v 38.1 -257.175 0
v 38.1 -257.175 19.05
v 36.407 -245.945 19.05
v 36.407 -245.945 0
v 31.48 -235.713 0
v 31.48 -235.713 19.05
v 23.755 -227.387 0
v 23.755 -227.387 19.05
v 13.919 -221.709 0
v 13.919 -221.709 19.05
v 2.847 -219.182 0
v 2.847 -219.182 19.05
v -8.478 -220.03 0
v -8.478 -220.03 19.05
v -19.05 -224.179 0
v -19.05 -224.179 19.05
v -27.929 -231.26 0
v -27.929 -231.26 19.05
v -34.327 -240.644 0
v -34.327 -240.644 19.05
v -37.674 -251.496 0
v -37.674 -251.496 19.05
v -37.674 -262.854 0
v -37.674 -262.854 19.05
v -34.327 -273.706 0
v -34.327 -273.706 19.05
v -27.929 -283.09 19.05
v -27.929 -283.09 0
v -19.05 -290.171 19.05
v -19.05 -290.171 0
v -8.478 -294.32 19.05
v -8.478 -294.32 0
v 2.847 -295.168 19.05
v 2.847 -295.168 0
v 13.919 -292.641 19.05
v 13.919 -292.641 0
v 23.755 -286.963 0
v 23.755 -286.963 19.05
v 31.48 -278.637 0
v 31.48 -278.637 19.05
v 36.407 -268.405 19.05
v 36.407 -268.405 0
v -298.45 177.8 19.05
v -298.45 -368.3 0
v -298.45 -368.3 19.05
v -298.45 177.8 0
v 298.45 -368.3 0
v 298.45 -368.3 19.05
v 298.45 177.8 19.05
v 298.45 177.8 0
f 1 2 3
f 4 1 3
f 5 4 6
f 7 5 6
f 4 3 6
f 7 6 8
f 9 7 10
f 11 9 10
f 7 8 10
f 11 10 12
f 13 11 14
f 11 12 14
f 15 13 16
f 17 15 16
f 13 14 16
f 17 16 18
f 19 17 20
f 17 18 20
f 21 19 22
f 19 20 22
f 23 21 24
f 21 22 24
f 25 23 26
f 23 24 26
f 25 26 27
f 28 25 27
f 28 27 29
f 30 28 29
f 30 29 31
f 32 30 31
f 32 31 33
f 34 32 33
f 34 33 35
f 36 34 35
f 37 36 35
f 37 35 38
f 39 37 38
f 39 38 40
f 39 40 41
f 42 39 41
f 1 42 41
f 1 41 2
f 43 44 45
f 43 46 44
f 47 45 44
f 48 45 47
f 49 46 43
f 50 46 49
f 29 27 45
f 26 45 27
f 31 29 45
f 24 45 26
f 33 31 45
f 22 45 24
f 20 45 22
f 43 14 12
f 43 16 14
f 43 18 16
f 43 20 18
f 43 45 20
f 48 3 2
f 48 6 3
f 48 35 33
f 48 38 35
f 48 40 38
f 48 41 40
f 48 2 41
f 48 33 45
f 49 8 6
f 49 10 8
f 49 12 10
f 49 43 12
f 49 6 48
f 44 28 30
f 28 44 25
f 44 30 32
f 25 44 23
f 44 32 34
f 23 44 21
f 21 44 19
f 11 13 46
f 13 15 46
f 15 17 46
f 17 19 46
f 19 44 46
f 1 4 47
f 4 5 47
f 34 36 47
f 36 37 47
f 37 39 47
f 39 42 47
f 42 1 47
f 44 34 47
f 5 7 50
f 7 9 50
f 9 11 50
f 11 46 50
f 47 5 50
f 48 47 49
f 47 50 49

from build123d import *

# Parameters (mm, degrees)
SKETCH1_W           = 596.9
SKETCH1_H           = 304.8
BOSS_EXTRUDE1_DEPTH = 19.05
SKETCH2_W           = 596.9
SKETCH2_H           = 19.05
BOSS_EXTRUDE2_DEPTH = 25.4
SKETCH3_W           = 596.9
SKETCH3_H           = 19.05
BOSS_EXTRUDE3_DEPTH = 215.9
SKETCH4_R           = 38.1
CUT_EXTRUDE1_DEPTH  = 20.05


with BuildPart() as part:
    # Sketch1 → Boss-Extrude1 (new body)
    with BuildSketch(Plane.XY):
        Rectangle(SKETCH1_W, SKETCH1_H)
    extrude(amount=BOSS_EXTRUDE1_DEPTH)

    # Sketch2 → Boss-Extrude2 (add)
    with BuildSketch(Plane(origin=(0, 152.4, 0), x_dir=(1, 0, 0), z_dir=(0, 1, 0))):
        with Locations((0, -9.525)):
            Rectangle(SKETCH2_W, SKETCH2_H)
    extrude(amount=BOSS_EXTRUDE2_DEPTH)

    # Sketch3 → Boss-Extrude3 (add)
    with BuildSketch(Plane.XZ.offset(152.4)):
        with Locations((0, 9.525)):
            Rectangle(SKETCH3_W, SKETCH3_H)
    extrude(amount=BOSS_EXTRUDE3_DEPTH)

    # Sketch4 → Cut-Extrude1 (cut, through all)
    with BuildSketch(Plane.XY.offset(19.05)):
        with Locations((0, -257.175)):
            Circle(SKETCH4_R)
    extrude(amount=-CUT_EXTRUDE1_DEPTH, mode=Mode.SUBTRACT)


solid = part.part
